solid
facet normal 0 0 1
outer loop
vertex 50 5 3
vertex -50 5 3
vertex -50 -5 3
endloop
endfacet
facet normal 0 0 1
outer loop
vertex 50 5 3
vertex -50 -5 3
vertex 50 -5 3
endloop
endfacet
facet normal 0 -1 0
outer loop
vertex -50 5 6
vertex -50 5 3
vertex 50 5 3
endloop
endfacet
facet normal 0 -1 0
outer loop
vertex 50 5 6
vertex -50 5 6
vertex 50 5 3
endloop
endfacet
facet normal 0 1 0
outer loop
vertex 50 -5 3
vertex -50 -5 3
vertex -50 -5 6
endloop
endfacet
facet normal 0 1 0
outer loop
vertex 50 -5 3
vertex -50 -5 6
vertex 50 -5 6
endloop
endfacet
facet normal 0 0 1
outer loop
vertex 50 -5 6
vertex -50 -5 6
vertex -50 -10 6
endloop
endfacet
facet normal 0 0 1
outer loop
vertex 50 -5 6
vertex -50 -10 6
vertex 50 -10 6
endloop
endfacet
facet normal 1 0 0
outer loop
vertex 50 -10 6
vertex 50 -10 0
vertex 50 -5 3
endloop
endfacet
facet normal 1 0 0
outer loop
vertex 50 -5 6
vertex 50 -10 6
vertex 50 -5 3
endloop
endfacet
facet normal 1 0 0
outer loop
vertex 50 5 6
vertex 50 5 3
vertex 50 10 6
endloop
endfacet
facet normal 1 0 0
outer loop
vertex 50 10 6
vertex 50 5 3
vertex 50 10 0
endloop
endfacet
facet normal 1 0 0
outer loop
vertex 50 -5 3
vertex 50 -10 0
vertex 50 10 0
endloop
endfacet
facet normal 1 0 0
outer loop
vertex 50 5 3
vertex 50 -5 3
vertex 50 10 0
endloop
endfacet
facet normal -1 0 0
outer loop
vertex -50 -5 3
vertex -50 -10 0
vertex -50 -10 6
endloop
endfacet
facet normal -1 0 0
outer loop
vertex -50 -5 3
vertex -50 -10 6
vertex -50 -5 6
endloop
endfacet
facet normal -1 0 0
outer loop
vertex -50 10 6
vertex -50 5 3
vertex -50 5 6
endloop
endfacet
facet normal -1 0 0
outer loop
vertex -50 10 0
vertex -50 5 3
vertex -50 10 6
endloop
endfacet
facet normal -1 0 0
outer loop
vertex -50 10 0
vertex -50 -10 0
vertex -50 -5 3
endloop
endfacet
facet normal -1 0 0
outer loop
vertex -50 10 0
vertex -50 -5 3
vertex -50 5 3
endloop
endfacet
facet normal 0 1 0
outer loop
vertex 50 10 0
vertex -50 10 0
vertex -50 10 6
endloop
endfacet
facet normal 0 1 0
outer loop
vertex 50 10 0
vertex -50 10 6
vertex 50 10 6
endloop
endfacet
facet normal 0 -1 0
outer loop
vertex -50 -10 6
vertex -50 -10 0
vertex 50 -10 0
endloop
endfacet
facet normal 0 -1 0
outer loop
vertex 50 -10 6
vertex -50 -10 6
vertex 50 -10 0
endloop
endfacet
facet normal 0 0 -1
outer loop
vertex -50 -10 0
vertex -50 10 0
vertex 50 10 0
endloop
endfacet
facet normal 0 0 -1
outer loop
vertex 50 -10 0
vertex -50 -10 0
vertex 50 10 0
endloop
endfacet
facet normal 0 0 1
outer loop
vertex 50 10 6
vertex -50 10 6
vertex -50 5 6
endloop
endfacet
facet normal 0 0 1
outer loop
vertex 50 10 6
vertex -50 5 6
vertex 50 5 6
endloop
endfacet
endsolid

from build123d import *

# Parameters (mm, degrees)
SKETCH_W     = 100
SKETCH_H     = 20
PAD_DEPTH    = 3
SKETCH001_W  = 100
SKETCH001_H  = 5
PAD001_DEPTH = 3


with BuildPart() as part:
    # Sketch → Pad (new body)
    with BuildSketch(Plane.XY):
        Rectangle(SKETCH_W, SKETCH_H)
    extrude(amount=PAD_DEPTH)

    # Sketch001 (on Face6 of Pad) → Pad001 (join)
    with BuildSketch(Plane.XY.offset(3)):
        with Locations((0, 7.5)):
            Rectangle(SKETCH001_W, SKETCH001_H)
        with Locations((0, -7.5)):
            Rectangle(SKETCH001_W, SKETCH001_H)
    extrude(amount=PAD001_DEPTH)


solid = part.part
